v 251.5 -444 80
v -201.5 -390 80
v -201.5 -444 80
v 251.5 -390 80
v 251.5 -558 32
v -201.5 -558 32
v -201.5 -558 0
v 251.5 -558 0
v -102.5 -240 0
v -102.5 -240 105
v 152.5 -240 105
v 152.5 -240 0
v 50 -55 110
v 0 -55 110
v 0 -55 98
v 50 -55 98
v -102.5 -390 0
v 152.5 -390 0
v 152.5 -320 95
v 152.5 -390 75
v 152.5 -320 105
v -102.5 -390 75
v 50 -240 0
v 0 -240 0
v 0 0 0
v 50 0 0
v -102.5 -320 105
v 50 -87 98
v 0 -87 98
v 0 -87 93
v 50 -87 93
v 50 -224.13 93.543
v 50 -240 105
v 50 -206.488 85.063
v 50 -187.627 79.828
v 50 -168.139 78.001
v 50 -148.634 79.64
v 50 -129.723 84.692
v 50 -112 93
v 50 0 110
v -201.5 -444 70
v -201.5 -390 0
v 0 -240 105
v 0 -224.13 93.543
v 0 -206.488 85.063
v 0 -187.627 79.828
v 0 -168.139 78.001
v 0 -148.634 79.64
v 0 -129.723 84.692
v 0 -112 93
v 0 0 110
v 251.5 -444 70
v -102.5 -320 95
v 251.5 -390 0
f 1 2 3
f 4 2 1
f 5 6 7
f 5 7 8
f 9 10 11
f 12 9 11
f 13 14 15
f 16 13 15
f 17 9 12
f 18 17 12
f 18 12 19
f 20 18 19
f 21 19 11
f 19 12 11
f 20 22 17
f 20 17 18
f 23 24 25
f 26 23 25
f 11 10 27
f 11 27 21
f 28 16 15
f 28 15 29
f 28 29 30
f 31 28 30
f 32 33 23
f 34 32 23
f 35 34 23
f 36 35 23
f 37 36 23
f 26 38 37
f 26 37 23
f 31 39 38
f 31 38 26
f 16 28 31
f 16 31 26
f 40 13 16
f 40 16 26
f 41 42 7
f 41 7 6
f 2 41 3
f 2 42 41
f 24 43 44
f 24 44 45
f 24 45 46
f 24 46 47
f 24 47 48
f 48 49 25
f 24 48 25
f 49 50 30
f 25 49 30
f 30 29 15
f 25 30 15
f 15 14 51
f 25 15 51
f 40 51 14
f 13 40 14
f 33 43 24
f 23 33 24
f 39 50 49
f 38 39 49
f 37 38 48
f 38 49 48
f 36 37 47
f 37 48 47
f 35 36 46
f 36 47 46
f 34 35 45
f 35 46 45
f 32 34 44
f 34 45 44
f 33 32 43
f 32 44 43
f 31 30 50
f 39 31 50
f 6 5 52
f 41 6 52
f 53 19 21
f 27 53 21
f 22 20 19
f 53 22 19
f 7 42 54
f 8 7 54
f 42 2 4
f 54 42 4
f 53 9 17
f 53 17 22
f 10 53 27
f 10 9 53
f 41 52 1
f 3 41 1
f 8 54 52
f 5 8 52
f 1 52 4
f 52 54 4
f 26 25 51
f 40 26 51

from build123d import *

# Parameters (mm, degrees)
F1_DEPTH      = 50
F2_W          = 255
F2_H          = 105
F3_DEPTH      = 150
F5_DEPTH      = 152.5
F5_DEPTH_BACK = 102.5
F6_W          = 453
F6_H          = 80
F7_DEPTH      = 168
F9_DEPTH      = 201.5
F9_DEPTH_BACK = 251.5


with BuildPart() as f1:
    # F0 (on Right) → F1 (new body)
    with BuildSketch(Plane.YZ):
        with BuildLine():
            Line((-240, 0), (0, 0))
            Line((0, 0), (0, 110))
            Line((0, 110), (-55, 110))
            Line((-55, 110), (-55, 98))
            Line((-55, 98), (-87, 98))
            Line((-87, 98), (-87, 93))
            Line((-87, 93), (-112, 93))
            ThreePointArc((-112, 93), (-177.9234989858, 78.4826774845), (-240, 105))
            Line((-240, 105), (-240, 0))
        make_face()
    extrude(amount=F1_DEPTH)


with BuildPart() as f3:
    # F2 (on face) → F3 (new body)
    with BuildSketch(Plane.XZ.offset(240)):
        with Locations((25, 52.5)):
            Rectangle(F2_W, F2_H)
    extrude(amount=F3_DEPTH)

    # F4 (on Right) → F5 (cut, two sides)
    with BuildSketch(Plane.YZ) as f5_sk:
        Polygon((-320, 105), (-390, 105), (-390, 75), (-320, 95), align=None)
    extrude(amount=F5_DEPTH, mode=Mode.SUBTRACT)
    extrude(f5_sk.sketch, amount=-F5_DEPTH_BACK, mode=Mode.SUBTRACT)


with BuildPart() as f7:
    # F6 (on face) → F7 (new body)
    with BuildSketch(Plane.XZ.offset(390)):
        with Locations((25, 40)):
            Rectangle(F6_W, F6_H)
    extrude(amount=F7_DEPTH)

    # F8 (on Right) → F9 (cut, two sides)
    with BuildSketch(Plane.YZ) as f9_sk:
        Polygon((-444, 80), (-558, 80), (-558, 32), (-444, 70), align=None)
    extrude(amount=-F9_DEPTH, mode=Mode.SUBTRACT)
    extrude(f9_sk.sketch, amount=F9_DEPTH_BACK, mode=Mode.SUBTRACT)


solid = Compound([f1.part, f3.part, f7.part])
